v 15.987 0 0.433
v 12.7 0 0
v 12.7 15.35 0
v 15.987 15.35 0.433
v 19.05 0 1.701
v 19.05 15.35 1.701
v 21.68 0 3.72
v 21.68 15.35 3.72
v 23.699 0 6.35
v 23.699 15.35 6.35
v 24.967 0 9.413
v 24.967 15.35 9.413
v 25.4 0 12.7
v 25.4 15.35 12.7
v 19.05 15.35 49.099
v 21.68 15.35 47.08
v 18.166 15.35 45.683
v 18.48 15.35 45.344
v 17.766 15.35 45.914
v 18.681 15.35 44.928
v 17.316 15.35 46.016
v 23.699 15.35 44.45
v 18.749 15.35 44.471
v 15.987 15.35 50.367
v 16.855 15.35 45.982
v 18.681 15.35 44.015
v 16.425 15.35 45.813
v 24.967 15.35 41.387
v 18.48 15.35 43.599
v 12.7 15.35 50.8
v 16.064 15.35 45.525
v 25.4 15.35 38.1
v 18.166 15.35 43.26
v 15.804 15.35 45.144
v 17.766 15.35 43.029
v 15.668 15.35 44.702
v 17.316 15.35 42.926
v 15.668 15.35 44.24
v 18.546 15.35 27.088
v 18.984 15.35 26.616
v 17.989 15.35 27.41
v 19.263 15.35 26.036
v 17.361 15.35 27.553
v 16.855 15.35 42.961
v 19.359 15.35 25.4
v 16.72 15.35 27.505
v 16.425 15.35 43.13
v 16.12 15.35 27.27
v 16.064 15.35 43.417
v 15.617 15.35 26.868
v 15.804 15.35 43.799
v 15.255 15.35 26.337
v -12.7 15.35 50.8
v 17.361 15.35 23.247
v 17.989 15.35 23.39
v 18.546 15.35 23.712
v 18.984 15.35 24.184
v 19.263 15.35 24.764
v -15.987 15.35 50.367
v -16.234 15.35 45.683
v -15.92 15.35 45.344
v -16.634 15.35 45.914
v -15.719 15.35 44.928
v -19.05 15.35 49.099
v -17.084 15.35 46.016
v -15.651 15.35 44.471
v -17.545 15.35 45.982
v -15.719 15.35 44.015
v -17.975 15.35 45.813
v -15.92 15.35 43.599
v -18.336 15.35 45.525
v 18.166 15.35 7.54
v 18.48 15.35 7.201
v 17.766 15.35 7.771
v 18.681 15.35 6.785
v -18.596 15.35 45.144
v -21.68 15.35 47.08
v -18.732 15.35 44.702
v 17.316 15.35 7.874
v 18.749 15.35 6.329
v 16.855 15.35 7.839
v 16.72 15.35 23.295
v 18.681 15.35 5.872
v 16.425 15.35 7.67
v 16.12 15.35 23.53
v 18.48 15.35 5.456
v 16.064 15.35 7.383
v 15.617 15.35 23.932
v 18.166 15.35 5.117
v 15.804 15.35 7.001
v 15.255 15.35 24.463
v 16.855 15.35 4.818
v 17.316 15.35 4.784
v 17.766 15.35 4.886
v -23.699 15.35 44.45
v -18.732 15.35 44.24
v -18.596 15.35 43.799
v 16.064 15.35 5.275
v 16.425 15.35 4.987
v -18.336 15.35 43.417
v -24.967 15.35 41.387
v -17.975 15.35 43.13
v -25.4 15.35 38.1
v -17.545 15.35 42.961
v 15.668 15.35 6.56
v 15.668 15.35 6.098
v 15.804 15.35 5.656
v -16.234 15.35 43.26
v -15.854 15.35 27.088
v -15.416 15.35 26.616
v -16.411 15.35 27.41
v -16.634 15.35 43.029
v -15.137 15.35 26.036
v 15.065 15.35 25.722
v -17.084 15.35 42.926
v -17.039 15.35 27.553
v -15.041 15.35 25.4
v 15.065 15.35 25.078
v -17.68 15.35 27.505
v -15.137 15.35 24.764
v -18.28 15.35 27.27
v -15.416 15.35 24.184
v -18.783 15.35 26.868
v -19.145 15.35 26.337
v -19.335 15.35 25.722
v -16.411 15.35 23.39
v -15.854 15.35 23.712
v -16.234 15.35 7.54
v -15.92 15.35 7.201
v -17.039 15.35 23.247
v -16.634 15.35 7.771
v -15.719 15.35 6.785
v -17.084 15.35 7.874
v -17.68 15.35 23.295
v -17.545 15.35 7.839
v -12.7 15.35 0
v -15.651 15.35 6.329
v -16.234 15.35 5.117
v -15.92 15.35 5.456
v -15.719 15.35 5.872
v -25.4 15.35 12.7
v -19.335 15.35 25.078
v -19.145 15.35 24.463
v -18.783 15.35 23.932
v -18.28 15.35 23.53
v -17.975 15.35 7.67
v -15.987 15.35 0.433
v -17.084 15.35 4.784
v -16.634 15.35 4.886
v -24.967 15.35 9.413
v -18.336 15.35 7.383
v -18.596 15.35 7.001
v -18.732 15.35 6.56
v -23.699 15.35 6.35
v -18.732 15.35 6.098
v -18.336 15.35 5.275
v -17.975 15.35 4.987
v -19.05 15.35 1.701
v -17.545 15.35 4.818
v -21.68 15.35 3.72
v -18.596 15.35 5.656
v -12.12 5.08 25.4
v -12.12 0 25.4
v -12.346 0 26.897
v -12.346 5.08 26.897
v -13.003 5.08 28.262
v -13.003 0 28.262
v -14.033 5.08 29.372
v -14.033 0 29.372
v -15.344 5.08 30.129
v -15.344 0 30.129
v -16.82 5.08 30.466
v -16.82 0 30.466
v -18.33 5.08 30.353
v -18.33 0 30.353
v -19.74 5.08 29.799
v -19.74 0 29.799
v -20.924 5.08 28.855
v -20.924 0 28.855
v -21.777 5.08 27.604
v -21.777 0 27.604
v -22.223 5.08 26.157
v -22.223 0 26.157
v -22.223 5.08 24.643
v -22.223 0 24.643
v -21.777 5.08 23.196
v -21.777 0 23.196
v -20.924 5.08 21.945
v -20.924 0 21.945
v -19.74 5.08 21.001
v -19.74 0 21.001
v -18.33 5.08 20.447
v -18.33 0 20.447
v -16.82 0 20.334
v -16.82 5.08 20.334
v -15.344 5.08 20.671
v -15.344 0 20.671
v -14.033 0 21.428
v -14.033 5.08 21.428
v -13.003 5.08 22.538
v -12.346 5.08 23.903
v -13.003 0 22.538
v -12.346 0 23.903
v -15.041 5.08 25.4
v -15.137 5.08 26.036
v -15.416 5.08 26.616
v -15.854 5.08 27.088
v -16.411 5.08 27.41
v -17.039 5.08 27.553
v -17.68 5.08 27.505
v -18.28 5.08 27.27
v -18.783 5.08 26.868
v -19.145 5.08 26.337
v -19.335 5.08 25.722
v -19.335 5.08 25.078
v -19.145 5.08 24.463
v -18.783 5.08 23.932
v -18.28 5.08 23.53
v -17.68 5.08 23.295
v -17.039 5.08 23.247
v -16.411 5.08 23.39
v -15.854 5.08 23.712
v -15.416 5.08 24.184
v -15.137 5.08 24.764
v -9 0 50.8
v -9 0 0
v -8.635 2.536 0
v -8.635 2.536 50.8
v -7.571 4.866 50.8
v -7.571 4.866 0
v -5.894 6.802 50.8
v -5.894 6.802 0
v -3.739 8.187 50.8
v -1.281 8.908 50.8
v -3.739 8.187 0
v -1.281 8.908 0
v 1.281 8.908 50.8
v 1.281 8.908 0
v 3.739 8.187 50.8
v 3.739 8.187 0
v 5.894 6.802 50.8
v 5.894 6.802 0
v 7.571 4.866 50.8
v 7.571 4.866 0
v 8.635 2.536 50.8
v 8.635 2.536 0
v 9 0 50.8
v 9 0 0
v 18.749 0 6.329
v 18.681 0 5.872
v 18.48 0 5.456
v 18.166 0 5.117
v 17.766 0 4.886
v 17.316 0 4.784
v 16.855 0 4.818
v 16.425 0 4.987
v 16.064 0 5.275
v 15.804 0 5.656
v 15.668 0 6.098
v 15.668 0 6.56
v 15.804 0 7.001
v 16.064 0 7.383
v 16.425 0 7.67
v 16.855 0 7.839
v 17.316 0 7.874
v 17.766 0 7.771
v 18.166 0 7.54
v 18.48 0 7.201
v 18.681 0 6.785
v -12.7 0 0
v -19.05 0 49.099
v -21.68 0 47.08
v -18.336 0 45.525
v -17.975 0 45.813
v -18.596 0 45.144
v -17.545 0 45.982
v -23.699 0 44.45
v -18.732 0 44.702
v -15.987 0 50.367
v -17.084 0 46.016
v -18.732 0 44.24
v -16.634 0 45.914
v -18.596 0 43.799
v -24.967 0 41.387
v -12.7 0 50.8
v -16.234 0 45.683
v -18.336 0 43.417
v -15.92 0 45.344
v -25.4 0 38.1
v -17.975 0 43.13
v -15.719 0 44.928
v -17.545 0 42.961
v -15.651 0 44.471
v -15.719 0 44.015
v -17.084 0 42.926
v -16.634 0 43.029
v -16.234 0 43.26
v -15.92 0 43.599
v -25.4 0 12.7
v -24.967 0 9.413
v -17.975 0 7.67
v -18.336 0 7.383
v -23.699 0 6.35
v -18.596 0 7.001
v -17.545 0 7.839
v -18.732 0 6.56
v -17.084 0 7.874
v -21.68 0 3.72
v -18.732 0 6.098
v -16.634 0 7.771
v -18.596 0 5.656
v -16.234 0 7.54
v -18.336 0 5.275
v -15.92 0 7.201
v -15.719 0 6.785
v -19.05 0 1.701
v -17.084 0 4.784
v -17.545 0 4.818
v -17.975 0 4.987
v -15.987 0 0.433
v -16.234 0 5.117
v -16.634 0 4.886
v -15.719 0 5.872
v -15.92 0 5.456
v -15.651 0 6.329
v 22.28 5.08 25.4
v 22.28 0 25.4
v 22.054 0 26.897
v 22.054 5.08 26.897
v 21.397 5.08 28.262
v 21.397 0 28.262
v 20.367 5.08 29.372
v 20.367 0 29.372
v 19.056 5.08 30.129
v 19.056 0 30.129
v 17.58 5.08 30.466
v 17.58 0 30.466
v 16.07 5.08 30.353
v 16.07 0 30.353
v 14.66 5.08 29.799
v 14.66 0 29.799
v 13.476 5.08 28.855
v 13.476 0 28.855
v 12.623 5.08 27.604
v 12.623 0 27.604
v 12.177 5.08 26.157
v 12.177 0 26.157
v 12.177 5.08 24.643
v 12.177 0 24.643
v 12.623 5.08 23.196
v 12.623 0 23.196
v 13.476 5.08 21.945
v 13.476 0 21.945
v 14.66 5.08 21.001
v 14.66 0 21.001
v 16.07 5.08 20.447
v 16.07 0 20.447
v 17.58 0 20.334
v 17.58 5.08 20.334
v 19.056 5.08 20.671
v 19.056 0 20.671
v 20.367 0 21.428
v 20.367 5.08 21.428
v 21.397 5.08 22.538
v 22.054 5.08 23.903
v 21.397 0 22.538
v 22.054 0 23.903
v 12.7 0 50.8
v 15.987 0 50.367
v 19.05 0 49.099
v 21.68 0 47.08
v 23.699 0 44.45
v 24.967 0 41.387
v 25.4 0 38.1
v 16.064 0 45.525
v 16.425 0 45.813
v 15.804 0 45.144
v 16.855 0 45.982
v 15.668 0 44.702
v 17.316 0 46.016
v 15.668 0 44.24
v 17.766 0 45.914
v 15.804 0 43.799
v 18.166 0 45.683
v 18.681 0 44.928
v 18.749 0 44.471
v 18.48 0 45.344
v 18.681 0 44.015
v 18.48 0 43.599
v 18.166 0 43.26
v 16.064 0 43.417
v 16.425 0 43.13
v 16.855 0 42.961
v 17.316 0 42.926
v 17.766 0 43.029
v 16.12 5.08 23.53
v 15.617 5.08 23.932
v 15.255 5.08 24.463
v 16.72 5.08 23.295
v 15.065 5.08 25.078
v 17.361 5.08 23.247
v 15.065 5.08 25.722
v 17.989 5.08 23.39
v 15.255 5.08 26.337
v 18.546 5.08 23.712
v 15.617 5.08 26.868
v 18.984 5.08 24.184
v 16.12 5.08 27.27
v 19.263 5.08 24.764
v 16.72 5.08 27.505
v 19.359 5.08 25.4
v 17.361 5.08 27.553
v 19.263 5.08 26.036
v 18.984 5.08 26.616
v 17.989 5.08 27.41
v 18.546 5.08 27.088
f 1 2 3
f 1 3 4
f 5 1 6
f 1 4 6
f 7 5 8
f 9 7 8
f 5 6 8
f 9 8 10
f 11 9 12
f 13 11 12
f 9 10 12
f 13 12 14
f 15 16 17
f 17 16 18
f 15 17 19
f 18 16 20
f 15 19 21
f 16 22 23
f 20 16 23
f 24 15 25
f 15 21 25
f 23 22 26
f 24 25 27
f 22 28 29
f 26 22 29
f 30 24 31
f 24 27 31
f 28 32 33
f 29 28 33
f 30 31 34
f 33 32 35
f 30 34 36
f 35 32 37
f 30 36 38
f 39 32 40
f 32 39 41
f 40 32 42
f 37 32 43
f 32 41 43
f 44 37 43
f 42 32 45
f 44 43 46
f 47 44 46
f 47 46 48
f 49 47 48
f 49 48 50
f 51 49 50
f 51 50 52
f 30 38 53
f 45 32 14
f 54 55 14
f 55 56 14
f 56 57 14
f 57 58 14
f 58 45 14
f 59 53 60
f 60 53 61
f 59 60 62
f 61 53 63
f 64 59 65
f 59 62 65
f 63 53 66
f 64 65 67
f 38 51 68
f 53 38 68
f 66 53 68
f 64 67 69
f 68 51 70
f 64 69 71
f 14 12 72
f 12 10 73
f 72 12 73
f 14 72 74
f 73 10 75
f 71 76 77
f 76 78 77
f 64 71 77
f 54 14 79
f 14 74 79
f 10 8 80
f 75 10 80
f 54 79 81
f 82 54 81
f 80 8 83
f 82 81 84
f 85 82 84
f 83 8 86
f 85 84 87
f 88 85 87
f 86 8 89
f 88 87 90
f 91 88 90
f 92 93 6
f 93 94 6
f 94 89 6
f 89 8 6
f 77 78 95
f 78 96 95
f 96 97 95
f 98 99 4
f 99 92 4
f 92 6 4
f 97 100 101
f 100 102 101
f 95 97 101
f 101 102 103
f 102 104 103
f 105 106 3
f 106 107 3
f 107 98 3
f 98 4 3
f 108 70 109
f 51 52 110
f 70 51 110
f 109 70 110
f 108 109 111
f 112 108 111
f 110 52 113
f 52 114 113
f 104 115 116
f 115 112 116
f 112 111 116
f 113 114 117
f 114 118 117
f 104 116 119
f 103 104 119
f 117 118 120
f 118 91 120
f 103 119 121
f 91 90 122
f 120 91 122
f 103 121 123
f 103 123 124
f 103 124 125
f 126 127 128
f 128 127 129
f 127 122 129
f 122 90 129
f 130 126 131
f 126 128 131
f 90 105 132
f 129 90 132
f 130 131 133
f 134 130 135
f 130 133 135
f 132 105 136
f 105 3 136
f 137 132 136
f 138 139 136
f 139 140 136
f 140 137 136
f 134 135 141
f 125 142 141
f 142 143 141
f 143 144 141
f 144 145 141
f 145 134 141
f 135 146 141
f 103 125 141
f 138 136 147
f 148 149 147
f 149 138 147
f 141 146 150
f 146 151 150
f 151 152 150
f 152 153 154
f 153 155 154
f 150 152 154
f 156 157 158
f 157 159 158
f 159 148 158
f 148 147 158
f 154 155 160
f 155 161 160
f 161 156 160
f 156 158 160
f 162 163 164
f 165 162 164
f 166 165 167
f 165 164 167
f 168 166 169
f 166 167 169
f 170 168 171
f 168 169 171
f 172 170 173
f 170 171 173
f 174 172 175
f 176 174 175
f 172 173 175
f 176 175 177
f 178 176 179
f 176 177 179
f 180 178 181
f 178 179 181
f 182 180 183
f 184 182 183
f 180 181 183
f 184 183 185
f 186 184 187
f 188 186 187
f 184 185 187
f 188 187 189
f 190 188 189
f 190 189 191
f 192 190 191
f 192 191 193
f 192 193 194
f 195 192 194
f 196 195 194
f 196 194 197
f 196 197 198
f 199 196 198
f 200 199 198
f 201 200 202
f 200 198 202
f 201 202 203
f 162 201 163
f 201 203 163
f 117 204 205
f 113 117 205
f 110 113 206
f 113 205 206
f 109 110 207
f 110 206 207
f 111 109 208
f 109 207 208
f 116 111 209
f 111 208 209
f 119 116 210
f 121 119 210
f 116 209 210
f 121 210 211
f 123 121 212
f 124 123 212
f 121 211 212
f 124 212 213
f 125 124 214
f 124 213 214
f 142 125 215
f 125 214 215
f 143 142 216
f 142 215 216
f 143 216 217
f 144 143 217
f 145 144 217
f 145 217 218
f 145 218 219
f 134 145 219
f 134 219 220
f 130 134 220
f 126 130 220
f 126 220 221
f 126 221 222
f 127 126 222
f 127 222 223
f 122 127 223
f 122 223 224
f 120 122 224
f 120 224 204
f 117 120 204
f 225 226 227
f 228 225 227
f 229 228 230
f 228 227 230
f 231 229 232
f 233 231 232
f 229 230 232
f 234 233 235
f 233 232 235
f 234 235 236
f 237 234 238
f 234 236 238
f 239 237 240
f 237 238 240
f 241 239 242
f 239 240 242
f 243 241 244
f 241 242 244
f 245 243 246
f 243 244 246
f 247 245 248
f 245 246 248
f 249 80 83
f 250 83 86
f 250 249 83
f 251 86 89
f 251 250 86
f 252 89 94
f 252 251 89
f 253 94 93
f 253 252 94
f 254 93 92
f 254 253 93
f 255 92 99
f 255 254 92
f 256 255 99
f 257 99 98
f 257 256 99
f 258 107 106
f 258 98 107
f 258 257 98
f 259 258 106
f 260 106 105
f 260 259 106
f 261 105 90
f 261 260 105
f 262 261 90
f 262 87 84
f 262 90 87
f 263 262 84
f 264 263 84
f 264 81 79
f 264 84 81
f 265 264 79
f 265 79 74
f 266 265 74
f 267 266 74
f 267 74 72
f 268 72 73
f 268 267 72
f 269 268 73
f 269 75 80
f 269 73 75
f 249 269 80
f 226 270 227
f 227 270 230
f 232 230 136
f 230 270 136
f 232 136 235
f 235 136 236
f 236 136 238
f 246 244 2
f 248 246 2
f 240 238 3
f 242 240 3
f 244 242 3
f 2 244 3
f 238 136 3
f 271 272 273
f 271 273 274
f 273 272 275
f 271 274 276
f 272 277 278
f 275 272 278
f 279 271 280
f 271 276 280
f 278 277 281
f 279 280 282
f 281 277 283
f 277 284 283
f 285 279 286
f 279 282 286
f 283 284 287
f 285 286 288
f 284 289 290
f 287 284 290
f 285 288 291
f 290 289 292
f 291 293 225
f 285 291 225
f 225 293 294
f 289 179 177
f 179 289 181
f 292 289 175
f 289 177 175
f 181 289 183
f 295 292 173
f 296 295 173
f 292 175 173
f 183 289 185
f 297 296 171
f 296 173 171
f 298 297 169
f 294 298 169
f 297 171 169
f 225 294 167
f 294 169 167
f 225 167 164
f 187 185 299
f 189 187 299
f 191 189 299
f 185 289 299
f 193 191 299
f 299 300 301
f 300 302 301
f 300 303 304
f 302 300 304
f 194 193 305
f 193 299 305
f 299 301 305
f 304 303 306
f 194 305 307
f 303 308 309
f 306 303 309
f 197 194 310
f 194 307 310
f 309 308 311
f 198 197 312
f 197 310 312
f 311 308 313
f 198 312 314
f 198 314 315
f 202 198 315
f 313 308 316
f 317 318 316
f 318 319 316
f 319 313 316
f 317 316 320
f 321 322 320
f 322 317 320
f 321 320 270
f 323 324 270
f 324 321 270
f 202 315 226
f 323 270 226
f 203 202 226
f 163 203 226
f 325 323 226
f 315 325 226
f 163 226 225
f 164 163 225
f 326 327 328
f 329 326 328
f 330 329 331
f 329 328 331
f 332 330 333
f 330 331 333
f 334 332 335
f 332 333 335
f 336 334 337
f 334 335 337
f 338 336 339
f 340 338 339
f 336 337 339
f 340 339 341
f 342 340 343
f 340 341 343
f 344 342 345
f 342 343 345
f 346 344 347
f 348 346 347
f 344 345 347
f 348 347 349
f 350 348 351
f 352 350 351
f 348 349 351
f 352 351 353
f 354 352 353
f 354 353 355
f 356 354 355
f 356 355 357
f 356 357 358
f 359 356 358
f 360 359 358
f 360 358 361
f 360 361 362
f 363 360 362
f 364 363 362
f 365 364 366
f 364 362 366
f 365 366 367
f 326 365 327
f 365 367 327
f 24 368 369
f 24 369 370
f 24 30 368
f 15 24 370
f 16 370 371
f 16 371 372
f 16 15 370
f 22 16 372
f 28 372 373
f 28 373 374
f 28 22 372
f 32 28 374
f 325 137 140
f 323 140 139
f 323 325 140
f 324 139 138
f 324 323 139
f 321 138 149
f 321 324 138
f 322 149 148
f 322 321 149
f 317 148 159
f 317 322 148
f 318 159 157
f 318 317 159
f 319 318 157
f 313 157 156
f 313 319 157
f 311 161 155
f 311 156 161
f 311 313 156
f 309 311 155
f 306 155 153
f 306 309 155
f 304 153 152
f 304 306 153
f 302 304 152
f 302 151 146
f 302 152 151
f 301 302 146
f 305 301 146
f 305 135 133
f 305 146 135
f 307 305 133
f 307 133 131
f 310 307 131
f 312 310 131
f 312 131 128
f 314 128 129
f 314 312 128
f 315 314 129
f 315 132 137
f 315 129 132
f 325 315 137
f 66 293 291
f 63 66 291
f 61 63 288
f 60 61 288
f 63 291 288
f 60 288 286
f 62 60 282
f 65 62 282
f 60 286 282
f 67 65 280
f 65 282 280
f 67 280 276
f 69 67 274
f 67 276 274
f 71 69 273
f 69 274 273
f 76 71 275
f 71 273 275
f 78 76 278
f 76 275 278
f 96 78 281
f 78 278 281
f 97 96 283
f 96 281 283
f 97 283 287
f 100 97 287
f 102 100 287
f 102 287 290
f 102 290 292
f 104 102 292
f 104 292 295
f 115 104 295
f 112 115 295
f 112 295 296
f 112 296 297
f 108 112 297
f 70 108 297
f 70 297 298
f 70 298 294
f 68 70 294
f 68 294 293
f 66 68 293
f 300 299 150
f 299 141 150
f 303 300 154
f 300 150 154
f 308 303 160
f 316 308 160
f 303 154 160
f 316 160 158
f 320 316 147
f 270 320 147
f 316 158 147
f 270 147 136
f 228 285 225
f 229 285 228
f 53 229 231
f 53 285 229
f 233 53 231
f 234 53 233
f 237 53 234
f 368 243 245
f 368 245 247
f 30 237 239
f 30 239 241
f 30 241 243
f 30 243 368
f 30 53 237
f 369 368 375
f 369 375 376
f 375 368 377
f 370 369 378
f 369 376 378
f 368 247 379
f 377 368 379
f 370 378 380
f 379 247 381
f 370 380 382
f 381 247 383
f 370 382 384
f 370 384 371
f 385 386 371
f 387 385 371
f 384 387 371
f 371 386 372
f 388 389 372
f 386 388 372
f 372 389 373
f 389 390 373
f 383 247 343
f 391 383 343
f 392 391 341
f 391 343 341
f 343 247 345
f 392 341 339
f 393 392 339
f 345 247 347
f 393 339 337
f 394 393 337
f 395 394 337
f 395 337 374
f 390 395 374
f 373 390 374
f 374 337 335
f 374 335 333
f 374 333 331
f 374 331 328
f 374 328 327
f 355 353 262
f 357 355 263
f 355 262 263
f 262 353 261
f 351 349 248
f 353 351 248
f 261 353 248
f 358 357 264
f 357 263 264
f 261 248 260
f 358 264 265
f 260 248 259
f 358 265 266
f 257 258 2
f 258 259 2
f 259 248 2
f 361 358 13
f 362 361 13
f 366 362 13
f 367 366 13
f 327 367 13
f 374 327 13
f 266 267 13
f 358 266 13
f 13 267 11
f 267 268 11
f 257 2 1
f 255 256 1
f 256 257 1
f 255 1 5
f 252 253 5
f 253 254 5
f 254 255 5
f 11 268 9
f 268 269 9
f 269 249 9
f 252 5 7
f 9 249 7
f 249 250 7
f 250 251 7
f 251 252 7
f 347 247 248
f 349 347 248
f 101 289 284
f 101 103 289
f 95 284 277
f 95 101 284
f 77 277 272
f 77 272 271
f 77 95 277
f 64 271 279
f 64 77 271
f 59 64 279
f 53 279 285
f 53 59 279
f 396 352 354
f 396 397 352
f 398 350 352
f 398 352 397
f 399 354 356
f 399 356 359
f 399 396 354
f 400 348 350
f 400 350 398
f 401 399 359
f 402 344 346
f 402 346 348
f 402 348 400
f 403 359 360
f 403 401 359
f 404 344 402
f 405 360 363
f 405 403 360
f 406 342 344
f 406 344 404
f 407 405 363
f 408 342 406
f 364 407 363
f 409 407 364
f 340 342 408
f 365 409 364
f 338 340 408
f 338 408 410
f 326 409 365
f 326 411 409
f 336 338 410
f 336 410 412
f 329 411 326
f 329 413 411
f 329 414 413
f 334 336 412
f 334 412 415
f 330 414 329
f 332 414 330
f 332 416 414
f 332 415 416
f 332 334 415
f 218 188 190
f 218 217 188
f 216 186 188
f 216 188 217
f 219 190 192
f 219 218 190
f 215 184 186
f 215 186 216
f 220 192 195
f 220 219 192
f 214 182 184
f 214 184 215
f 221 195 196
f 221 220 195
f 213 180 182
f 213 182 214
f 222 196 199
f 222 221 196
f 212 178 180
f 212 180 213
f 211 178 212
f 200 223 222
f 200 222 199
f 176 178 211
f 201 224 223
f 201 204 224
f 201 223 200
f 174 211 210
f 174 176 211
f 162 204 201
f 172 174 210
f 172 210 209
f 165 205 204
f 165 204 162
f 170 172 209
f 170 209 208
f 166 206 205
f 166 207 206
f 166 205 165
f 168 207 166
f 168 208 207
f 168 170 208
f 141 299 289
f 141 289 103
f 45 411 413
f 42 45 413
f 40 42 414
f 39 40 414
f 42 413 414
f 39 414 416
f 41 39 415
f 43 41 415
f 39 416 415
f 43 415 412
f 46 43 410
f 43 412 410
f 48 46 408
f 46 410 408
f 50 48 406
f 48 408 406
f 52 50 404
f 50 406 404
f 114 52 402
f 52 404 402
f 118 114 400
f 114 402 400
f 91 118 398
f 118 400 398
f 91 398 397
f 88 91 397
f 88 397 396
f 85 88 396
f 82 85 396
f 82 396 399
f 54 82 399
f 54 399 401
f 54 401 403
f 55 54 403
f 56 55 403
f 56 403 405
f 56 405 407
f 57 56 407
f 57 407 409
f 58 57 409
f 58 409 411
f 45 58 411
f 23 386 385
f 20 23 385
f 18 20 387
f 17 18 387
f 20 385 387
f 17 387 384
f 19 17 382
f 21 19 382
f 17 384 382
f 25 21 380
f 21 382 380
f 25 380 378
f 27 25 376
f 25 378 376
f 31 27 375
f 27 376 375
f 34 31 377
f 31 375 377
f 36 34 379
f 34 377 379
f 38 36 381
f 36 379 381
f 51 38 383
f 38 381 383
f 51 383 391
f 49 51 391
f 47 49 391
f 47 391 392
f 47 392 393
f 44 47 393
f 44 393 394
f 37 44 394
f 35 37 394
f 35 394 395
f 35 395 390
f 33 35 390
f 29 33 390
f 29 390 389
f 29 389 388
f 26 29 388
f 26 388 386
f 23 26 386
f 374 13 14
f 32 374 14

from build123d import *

# Parameters (mm, degrees)
F0_W      = 50.8
F0_H      = 50.8
F1_DEPTH  = 50.8
F2_R      = 9
F3_DEPTH  = 407.416
F4_W      = 60.1204171121
F4_H      = 25.4
F5_DEPTH  = 338.582
F6_R      = 5.08
F7_DEPTH  = 5.08
F8_R      = 2.159
F9_DEPTH  = 25.4
F10_R     = 1.5494
F11_DEPTH = 25.4
F12_R     = 1.5494
F12_R_2   = 2.159
F13_DEPTH = 25.4
F14_R     = 5.08
F15_DEPTH = 5.08
F19_DEPTH = 72.39
F22_R     = 12.7


with BuildPart() as f1:
    # F0 (on Top) → F1 (new body)
    with BuildSketch(Plane.XY):
        Rectangle(F0_W, F0_H)
    extrude(amount=F1_DEPTH)

    # F2 (on face) → F3 (cut)
    with BuildSketch(Plane(origin=(0, 0, 0), x_dir=(1, 0, 0), z_dir=(0, 0, -1))):
        Circle(F2_R)
    extrude(amount=-F3_DEPTH, mode=Mode.SUBTRACT)

    # F4 (on face) → F5 (cut)
    with BuildSketch(Plane(origin=(0, 0, 0), x_dir=(1, 0, 0), z_dir=(0, 0, -1))):
        with Locations((4.6602085561, 12.7)):
            Rectangle(F4_W, F4_H)
    extrude(amount=-F5_DEPTH, mode=Mode.SUBTRACT)

    # F6 (on face) → F7 (cut)
    with BuildSketch(Plane.XZ):
        with Locations((-17.2, 25.4)):
            Circle(F6_R)
    extrude(amount=-F7_DEPTH, mode=Mode.SUBTRACT)

    # F8 (on face) → F9 (cut)
    with BuildSketch(Plane.XZ.offset(-5.08)):
        with Locations((-17.2, 25.4)):
            Circle(F8_R)
    extrude(amount=-F9_DEPTH, mode=Mode.SUBTRACT)

    # F10 (on face) → F11 (cut)
    with BuildSketch(Plane.XZ):
        with Locations((-17.2, 44.4713309407)):
            Circle(F10_R)
    extrude(amount=-F11_DEPTH, mode=Mode.SUBTRACT)

    # F12 (on face) → F13 (cut)
    with BuildSketch(Plane.XZ):
        with Locations((17.2, 44.4713309407)):
            Circle(F12_R)
        with Locations((17.2, 25.4)):
            Circle(F12_R_2)
    extrude(amount=-F13_DEPTH, mode=Mode.SUBTRACT)

    # F14 (on face) → F15 (cut)
    with BuildSketch(Plane.XZ):
        with Locations((17.2, 25.4)):
            Circle(F14_R)
    extrude(amount=-F15_DEPTH, mode=Mode.SUBTRACT)

    # F17: F1 across plane


with BuildPart() as f1_1:
    add(f1.part)
    add(f1.part.mirror(Plane(origin=(0, 13.6714489466, 25.4), x_dir=(1, 0, 0), z_dir=(0, 0, 1))), mode=Mode.INTERSECT)

    # F18 (on face) → F19 (cut)
    with BuildSketch(Plane(origin=(0, 0, 0), x_dir=(1, 0, 0), z_dir=(0, 0, -1))):
        Polygon((37.3146161437, -15.35), (0, -15.35), (-44.7141490877, -15.35), (-42.6479764283, -31.9298505783), (43.3826521039, -33.9571945369), align=None)
    extrude(amount=-F19_DEPTH, mode=Mode.SUBTRACT)

    # F22
    f22_edges = [f1_1.edges().sort_by_distance(p)[0] for p in [
        (25.4, 7.675, 50.8),
        (25.4, 7.675, 0),
        (-25.4, 7.675, 50.8),
        (-25.4, 7.675, 0),
    ]]
    fillet(f22_edges, radius=F22_R)


solid = f1_1.part
